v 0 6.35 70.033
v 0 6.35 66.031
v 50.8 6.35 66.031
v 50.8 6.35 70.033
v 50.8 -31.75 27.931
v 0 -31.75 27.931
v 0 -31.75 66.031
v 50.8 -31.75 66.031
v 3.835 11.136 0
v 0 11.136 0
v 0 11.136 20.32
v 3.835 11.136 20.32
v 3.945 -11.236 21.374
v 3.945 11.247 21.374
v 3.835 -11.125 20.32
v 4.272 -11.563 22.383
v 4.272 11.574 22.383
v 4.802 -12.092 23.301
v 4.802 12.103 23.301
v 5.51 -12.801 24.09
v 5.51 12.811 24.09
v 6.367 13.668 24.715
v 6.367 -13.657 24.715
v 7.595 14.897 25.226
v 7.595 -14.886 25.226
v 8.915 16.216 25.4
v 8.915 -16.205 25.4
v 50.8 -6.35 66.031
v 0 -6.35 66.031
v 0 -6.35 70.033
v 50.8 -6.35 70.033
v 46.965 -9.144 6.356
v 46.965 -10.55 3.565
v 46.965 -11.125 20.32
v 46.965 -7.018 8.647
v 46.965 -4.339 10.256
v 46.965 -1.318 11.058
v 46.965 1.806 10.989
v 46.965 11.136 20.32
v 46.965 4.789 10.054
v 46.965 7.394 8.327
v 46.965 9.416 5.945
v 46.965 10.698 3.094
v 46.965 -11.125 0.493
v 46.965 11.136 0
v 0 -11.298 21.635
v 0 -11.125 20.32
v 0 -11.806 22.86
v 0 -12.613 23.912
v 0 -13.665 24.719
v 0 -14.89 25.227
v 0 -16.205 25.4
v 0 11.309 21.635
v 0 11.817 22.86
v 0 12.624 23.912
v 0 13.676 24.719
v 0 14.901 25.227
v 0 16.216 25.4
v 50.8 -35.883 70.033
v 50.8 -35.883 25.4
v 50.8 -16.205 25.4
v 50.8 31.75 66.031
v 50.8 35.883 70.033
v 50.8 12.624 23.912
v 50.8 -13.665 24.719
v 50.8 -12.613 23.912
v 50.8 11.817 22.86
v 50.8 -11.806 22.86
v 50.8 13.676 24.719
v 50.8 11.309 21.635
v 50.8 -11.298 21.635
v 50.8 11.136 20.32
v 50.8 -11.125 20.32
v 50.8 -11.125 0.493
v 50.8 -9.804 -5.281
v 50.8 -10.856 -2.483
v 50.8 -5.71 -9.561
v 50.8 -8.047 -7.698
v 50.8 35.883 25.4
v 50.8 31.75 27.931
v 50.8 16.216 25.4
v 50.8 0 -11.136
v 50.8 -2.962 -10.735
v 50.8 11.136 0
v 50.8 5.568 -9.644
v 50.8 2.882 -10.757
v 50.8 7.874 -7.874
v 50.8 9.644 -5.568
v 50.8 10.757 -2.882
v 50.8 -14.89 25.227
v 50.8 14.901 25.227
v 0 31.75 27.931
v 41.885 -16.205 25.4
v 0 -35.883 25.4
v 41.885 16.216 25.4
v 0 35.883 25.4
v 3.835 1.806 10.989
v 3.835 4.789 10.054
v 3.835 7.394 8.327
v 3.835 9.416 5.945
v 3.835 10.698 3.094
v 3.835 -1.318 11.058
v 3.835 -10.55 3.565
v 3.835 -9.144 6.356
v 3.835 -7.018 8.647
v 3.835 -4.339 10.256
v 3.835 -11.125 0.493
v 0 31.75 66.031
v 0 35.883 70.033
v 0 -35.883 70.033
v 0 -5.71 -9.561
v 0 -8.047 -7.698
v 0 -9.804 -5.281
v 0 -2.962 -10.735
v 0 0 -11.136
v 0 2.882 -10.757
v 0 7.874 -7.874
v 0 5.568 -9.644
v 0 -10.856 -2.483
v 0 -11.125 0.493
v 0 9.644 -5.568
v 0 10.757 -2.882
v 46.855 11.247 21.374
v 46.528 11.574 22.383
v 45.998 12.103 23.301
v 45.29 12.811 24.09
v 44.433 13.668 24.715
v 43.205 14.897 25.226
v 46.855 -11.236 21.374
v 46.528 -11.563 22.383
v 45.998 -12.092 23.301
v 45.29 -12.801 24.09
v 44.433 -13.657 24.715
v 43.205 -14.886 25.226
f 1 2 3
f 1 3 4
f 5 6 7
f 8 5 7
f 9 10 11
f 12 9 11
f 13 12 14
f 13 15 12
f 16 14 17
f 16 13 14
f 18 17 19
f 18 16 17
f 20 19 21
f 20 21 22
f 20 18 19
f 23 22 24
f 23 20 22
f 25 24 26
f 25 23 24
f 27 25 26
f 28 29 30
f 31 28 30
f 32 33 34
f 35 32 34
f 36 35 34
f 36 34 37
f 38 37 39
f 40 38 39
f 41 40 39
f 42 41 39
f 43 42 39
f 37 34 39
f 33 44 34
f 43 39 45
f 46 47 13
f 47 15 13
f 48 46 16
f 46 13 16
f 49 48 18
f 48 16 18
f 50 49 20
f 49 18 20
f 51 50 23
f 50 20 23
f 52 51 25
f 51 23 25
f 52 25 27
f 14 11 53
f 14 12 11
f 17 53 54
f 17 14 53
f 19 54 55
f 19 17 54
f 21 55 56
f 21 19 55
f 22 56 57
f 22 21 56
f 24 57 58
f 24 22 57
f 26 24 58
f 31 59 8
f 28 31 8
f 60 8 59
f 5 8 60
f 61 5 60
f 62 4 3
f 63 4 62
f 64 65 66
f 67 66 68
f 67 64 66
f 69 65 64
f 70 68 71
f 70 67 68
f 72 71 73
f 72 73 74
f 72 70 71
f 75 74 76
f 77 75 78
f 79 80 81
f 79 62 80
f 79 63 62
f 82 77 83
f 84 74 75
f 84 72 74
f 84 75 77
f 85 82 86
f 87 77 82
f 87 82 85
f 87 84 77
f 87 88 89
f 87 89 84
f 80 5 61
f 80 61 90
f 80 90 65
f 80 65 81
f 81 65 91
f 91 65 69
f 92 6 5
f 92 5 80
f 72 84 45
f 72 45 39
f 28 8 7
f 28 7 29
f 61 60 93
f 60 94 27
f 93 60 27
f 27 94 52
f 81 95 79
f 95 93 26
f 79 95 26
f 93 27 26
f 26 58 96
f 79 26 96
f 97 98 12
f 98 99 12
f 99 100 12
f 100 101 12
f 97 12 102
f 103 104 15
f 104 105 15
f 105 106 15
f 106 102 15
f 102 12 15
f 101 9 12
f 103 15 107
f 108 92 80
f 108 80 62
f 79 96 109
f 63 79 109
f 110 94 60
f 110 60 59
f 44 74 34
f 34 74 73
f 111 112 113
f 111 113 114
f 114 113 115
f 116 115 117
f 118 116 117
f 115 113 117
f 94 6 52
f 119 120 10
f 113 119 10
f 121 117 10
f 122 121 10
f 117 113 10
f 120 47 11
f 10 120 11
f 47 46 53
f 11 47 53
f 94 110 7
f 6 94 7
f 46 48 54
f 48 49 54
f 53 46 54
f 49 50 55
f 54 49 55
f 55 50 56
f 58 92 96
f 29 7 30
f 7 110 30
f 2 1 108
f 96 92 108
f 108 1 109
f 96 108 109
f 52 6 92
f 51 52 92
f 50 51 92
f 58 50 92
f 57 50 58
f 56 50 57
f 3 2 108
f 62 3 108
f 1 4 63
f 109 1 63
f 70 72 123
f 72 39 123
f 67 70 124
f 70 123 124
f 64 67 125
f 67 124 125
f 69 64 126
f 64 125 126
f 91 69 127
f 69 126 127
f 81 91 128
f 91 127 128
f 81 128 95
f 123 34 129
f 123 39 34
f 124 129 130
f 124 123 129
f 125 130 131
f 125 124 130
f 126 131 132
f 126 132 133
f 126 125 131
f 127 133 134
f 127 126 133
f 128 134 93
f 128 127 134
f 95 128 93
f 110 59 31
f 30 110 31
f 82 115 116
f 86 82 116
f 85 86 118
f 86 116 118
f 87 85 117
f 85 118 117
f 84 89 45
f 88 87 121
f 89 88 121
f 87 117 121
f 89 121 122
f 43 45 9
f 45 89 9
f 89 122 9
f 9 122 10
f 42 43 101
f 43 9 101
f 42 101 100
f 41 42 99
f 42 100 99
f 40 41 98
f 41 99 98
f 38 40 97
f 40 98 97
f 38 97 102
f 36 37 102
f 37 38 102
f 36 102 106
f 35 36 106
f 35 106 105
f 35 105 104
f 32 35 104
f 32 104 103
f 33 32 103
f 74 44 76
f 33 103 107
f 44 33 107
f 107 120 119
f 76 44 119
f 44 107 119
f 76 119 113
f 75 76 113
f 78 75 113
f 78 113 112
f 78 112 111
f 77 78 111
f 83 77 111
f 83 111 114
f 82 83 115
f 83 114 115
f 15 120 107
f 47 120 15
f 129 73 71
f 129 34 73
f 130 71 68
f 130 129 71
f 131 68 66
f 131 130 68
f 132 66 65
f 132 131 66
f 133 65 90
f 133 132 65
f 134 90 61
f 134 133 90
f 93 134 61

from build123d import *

# Parameters (mm, degrees)
SKETCH1_R           = 11.136121628
BOSS_EXTRUDE1_DEPTH = 50.8
SKETCH2_W           = 22.261321628
SKETCH2_H           = 25.4
BOSS_EXTRUDE2_DEPTH = 3.834635566
SKETCH3_W           = 63.5
SKETCH3_H           = 2.530898103
BOSS_EXTRUDE3_DEPTH = 50.8
SKETCH4_W           = 4.132939296
SKETCH4_H           = 40.630898103
BOSS_EXTRUDE4_DEPTH = 50.8
SKETCH5_W           = 29.532939296
SKETCH5_H           = 4.001701266
BOSS_EXTRUDE5_DEPTH = 50.8
SKETCH6_W           = 22.261321628
SKETCH6_H           = 25.4
BOSS_EXTRUDE6_DEPTH = 3.834635566
FILLET2_R           = 5.08


with BuildPart() as part:
    # Sketch1 → Boss-Extrude1 (new body)
    with BuildSketch(Plane.YZ):
        with Locations(Location((0, 0, 0), (0, 0, 270))):
            Circle(SKETCH1_R)
    extrude(amount=BOSS_EXTRUDE1_DEPTH)

    # Sketch2 → Boss-Extrude2 (add)
    with BuildSketch(Plane(origin=(0, 0, 0), x_dir=(0, -1, 0), z_dir=(-1, 0, 0))):
        with Locations((-0.005460814, 12.7)):
            Rectangle(SKETCH2_W, SKETCH2_H)
    extrude(amount=-BOSS_EXTRUDE2_DEPTH)

    # Sketch3 → Boss-Extrude3 (add)
    with BuildSketch(Plane.YZ):
        with Locations((0, 26.665449052)):
            Rectangle(SKETCH3_W, SKETCH3_H)
    extrude(amount=BOSS_EXTRUDE3_DEPTH)

    # Sketch4 → Boss-Extrude4 (add)
    with BuildSketch(Plane.YZ):
        with Locations((-33.816469648, 45.715449052)):
            Rectangle(SKETCH4_W, SKETCH4_H)
        with Locations((33.816469648, 45.715449052)):
            Rectangle(SKETCH4_W, SKETCH4_H)
    extrude(amount=BOSS_EXTRUDE4_DEPTH)

    # Sketch5 → Boss-Extrude5 (add)
    with BuildSketch(Plane.YZ):
        with Locations((-21.116469648, 68.031748736)):
            Rectangle(SKETCH5_W, SKETCH5_H)
        with Locations((21.116469648, 68.031748736)):
            Rectangle(SKETCH5_W, SKETCH5_H)
    extrude(amount=BOSS_EXTRUDE5_DEPTH)

    # Sketch6 → Boss-Extrude6 (add)
    with BuildSketch(Plane.YZ.offset(50.8)):
        with Locations((0.005460814, 12.7)):
            Rectangle(SKETCH6_W, SKETCH6_H)
    extrude(amount=-BOSS_EXTRUDE6_DEPTH)

    # Fillet2
    fillet2_edges = [part.edges().sort_by_distance(p)[0] for p in [
        (1.917317783, 11.136121628, 25.4),
        (3.834635566, 0.005460814, 25.4),
        (1.917317783, -11.1252, 25.4),
        (46.965364434, 0.005460814, 25.4),
        (48.882682217, -11.1252, 25.4),
        (48.882682217, 11.136121628, 25.4),
    ]]
    fillet(fillet2_edges, radius=FILLET2_R)


solid = part.part
